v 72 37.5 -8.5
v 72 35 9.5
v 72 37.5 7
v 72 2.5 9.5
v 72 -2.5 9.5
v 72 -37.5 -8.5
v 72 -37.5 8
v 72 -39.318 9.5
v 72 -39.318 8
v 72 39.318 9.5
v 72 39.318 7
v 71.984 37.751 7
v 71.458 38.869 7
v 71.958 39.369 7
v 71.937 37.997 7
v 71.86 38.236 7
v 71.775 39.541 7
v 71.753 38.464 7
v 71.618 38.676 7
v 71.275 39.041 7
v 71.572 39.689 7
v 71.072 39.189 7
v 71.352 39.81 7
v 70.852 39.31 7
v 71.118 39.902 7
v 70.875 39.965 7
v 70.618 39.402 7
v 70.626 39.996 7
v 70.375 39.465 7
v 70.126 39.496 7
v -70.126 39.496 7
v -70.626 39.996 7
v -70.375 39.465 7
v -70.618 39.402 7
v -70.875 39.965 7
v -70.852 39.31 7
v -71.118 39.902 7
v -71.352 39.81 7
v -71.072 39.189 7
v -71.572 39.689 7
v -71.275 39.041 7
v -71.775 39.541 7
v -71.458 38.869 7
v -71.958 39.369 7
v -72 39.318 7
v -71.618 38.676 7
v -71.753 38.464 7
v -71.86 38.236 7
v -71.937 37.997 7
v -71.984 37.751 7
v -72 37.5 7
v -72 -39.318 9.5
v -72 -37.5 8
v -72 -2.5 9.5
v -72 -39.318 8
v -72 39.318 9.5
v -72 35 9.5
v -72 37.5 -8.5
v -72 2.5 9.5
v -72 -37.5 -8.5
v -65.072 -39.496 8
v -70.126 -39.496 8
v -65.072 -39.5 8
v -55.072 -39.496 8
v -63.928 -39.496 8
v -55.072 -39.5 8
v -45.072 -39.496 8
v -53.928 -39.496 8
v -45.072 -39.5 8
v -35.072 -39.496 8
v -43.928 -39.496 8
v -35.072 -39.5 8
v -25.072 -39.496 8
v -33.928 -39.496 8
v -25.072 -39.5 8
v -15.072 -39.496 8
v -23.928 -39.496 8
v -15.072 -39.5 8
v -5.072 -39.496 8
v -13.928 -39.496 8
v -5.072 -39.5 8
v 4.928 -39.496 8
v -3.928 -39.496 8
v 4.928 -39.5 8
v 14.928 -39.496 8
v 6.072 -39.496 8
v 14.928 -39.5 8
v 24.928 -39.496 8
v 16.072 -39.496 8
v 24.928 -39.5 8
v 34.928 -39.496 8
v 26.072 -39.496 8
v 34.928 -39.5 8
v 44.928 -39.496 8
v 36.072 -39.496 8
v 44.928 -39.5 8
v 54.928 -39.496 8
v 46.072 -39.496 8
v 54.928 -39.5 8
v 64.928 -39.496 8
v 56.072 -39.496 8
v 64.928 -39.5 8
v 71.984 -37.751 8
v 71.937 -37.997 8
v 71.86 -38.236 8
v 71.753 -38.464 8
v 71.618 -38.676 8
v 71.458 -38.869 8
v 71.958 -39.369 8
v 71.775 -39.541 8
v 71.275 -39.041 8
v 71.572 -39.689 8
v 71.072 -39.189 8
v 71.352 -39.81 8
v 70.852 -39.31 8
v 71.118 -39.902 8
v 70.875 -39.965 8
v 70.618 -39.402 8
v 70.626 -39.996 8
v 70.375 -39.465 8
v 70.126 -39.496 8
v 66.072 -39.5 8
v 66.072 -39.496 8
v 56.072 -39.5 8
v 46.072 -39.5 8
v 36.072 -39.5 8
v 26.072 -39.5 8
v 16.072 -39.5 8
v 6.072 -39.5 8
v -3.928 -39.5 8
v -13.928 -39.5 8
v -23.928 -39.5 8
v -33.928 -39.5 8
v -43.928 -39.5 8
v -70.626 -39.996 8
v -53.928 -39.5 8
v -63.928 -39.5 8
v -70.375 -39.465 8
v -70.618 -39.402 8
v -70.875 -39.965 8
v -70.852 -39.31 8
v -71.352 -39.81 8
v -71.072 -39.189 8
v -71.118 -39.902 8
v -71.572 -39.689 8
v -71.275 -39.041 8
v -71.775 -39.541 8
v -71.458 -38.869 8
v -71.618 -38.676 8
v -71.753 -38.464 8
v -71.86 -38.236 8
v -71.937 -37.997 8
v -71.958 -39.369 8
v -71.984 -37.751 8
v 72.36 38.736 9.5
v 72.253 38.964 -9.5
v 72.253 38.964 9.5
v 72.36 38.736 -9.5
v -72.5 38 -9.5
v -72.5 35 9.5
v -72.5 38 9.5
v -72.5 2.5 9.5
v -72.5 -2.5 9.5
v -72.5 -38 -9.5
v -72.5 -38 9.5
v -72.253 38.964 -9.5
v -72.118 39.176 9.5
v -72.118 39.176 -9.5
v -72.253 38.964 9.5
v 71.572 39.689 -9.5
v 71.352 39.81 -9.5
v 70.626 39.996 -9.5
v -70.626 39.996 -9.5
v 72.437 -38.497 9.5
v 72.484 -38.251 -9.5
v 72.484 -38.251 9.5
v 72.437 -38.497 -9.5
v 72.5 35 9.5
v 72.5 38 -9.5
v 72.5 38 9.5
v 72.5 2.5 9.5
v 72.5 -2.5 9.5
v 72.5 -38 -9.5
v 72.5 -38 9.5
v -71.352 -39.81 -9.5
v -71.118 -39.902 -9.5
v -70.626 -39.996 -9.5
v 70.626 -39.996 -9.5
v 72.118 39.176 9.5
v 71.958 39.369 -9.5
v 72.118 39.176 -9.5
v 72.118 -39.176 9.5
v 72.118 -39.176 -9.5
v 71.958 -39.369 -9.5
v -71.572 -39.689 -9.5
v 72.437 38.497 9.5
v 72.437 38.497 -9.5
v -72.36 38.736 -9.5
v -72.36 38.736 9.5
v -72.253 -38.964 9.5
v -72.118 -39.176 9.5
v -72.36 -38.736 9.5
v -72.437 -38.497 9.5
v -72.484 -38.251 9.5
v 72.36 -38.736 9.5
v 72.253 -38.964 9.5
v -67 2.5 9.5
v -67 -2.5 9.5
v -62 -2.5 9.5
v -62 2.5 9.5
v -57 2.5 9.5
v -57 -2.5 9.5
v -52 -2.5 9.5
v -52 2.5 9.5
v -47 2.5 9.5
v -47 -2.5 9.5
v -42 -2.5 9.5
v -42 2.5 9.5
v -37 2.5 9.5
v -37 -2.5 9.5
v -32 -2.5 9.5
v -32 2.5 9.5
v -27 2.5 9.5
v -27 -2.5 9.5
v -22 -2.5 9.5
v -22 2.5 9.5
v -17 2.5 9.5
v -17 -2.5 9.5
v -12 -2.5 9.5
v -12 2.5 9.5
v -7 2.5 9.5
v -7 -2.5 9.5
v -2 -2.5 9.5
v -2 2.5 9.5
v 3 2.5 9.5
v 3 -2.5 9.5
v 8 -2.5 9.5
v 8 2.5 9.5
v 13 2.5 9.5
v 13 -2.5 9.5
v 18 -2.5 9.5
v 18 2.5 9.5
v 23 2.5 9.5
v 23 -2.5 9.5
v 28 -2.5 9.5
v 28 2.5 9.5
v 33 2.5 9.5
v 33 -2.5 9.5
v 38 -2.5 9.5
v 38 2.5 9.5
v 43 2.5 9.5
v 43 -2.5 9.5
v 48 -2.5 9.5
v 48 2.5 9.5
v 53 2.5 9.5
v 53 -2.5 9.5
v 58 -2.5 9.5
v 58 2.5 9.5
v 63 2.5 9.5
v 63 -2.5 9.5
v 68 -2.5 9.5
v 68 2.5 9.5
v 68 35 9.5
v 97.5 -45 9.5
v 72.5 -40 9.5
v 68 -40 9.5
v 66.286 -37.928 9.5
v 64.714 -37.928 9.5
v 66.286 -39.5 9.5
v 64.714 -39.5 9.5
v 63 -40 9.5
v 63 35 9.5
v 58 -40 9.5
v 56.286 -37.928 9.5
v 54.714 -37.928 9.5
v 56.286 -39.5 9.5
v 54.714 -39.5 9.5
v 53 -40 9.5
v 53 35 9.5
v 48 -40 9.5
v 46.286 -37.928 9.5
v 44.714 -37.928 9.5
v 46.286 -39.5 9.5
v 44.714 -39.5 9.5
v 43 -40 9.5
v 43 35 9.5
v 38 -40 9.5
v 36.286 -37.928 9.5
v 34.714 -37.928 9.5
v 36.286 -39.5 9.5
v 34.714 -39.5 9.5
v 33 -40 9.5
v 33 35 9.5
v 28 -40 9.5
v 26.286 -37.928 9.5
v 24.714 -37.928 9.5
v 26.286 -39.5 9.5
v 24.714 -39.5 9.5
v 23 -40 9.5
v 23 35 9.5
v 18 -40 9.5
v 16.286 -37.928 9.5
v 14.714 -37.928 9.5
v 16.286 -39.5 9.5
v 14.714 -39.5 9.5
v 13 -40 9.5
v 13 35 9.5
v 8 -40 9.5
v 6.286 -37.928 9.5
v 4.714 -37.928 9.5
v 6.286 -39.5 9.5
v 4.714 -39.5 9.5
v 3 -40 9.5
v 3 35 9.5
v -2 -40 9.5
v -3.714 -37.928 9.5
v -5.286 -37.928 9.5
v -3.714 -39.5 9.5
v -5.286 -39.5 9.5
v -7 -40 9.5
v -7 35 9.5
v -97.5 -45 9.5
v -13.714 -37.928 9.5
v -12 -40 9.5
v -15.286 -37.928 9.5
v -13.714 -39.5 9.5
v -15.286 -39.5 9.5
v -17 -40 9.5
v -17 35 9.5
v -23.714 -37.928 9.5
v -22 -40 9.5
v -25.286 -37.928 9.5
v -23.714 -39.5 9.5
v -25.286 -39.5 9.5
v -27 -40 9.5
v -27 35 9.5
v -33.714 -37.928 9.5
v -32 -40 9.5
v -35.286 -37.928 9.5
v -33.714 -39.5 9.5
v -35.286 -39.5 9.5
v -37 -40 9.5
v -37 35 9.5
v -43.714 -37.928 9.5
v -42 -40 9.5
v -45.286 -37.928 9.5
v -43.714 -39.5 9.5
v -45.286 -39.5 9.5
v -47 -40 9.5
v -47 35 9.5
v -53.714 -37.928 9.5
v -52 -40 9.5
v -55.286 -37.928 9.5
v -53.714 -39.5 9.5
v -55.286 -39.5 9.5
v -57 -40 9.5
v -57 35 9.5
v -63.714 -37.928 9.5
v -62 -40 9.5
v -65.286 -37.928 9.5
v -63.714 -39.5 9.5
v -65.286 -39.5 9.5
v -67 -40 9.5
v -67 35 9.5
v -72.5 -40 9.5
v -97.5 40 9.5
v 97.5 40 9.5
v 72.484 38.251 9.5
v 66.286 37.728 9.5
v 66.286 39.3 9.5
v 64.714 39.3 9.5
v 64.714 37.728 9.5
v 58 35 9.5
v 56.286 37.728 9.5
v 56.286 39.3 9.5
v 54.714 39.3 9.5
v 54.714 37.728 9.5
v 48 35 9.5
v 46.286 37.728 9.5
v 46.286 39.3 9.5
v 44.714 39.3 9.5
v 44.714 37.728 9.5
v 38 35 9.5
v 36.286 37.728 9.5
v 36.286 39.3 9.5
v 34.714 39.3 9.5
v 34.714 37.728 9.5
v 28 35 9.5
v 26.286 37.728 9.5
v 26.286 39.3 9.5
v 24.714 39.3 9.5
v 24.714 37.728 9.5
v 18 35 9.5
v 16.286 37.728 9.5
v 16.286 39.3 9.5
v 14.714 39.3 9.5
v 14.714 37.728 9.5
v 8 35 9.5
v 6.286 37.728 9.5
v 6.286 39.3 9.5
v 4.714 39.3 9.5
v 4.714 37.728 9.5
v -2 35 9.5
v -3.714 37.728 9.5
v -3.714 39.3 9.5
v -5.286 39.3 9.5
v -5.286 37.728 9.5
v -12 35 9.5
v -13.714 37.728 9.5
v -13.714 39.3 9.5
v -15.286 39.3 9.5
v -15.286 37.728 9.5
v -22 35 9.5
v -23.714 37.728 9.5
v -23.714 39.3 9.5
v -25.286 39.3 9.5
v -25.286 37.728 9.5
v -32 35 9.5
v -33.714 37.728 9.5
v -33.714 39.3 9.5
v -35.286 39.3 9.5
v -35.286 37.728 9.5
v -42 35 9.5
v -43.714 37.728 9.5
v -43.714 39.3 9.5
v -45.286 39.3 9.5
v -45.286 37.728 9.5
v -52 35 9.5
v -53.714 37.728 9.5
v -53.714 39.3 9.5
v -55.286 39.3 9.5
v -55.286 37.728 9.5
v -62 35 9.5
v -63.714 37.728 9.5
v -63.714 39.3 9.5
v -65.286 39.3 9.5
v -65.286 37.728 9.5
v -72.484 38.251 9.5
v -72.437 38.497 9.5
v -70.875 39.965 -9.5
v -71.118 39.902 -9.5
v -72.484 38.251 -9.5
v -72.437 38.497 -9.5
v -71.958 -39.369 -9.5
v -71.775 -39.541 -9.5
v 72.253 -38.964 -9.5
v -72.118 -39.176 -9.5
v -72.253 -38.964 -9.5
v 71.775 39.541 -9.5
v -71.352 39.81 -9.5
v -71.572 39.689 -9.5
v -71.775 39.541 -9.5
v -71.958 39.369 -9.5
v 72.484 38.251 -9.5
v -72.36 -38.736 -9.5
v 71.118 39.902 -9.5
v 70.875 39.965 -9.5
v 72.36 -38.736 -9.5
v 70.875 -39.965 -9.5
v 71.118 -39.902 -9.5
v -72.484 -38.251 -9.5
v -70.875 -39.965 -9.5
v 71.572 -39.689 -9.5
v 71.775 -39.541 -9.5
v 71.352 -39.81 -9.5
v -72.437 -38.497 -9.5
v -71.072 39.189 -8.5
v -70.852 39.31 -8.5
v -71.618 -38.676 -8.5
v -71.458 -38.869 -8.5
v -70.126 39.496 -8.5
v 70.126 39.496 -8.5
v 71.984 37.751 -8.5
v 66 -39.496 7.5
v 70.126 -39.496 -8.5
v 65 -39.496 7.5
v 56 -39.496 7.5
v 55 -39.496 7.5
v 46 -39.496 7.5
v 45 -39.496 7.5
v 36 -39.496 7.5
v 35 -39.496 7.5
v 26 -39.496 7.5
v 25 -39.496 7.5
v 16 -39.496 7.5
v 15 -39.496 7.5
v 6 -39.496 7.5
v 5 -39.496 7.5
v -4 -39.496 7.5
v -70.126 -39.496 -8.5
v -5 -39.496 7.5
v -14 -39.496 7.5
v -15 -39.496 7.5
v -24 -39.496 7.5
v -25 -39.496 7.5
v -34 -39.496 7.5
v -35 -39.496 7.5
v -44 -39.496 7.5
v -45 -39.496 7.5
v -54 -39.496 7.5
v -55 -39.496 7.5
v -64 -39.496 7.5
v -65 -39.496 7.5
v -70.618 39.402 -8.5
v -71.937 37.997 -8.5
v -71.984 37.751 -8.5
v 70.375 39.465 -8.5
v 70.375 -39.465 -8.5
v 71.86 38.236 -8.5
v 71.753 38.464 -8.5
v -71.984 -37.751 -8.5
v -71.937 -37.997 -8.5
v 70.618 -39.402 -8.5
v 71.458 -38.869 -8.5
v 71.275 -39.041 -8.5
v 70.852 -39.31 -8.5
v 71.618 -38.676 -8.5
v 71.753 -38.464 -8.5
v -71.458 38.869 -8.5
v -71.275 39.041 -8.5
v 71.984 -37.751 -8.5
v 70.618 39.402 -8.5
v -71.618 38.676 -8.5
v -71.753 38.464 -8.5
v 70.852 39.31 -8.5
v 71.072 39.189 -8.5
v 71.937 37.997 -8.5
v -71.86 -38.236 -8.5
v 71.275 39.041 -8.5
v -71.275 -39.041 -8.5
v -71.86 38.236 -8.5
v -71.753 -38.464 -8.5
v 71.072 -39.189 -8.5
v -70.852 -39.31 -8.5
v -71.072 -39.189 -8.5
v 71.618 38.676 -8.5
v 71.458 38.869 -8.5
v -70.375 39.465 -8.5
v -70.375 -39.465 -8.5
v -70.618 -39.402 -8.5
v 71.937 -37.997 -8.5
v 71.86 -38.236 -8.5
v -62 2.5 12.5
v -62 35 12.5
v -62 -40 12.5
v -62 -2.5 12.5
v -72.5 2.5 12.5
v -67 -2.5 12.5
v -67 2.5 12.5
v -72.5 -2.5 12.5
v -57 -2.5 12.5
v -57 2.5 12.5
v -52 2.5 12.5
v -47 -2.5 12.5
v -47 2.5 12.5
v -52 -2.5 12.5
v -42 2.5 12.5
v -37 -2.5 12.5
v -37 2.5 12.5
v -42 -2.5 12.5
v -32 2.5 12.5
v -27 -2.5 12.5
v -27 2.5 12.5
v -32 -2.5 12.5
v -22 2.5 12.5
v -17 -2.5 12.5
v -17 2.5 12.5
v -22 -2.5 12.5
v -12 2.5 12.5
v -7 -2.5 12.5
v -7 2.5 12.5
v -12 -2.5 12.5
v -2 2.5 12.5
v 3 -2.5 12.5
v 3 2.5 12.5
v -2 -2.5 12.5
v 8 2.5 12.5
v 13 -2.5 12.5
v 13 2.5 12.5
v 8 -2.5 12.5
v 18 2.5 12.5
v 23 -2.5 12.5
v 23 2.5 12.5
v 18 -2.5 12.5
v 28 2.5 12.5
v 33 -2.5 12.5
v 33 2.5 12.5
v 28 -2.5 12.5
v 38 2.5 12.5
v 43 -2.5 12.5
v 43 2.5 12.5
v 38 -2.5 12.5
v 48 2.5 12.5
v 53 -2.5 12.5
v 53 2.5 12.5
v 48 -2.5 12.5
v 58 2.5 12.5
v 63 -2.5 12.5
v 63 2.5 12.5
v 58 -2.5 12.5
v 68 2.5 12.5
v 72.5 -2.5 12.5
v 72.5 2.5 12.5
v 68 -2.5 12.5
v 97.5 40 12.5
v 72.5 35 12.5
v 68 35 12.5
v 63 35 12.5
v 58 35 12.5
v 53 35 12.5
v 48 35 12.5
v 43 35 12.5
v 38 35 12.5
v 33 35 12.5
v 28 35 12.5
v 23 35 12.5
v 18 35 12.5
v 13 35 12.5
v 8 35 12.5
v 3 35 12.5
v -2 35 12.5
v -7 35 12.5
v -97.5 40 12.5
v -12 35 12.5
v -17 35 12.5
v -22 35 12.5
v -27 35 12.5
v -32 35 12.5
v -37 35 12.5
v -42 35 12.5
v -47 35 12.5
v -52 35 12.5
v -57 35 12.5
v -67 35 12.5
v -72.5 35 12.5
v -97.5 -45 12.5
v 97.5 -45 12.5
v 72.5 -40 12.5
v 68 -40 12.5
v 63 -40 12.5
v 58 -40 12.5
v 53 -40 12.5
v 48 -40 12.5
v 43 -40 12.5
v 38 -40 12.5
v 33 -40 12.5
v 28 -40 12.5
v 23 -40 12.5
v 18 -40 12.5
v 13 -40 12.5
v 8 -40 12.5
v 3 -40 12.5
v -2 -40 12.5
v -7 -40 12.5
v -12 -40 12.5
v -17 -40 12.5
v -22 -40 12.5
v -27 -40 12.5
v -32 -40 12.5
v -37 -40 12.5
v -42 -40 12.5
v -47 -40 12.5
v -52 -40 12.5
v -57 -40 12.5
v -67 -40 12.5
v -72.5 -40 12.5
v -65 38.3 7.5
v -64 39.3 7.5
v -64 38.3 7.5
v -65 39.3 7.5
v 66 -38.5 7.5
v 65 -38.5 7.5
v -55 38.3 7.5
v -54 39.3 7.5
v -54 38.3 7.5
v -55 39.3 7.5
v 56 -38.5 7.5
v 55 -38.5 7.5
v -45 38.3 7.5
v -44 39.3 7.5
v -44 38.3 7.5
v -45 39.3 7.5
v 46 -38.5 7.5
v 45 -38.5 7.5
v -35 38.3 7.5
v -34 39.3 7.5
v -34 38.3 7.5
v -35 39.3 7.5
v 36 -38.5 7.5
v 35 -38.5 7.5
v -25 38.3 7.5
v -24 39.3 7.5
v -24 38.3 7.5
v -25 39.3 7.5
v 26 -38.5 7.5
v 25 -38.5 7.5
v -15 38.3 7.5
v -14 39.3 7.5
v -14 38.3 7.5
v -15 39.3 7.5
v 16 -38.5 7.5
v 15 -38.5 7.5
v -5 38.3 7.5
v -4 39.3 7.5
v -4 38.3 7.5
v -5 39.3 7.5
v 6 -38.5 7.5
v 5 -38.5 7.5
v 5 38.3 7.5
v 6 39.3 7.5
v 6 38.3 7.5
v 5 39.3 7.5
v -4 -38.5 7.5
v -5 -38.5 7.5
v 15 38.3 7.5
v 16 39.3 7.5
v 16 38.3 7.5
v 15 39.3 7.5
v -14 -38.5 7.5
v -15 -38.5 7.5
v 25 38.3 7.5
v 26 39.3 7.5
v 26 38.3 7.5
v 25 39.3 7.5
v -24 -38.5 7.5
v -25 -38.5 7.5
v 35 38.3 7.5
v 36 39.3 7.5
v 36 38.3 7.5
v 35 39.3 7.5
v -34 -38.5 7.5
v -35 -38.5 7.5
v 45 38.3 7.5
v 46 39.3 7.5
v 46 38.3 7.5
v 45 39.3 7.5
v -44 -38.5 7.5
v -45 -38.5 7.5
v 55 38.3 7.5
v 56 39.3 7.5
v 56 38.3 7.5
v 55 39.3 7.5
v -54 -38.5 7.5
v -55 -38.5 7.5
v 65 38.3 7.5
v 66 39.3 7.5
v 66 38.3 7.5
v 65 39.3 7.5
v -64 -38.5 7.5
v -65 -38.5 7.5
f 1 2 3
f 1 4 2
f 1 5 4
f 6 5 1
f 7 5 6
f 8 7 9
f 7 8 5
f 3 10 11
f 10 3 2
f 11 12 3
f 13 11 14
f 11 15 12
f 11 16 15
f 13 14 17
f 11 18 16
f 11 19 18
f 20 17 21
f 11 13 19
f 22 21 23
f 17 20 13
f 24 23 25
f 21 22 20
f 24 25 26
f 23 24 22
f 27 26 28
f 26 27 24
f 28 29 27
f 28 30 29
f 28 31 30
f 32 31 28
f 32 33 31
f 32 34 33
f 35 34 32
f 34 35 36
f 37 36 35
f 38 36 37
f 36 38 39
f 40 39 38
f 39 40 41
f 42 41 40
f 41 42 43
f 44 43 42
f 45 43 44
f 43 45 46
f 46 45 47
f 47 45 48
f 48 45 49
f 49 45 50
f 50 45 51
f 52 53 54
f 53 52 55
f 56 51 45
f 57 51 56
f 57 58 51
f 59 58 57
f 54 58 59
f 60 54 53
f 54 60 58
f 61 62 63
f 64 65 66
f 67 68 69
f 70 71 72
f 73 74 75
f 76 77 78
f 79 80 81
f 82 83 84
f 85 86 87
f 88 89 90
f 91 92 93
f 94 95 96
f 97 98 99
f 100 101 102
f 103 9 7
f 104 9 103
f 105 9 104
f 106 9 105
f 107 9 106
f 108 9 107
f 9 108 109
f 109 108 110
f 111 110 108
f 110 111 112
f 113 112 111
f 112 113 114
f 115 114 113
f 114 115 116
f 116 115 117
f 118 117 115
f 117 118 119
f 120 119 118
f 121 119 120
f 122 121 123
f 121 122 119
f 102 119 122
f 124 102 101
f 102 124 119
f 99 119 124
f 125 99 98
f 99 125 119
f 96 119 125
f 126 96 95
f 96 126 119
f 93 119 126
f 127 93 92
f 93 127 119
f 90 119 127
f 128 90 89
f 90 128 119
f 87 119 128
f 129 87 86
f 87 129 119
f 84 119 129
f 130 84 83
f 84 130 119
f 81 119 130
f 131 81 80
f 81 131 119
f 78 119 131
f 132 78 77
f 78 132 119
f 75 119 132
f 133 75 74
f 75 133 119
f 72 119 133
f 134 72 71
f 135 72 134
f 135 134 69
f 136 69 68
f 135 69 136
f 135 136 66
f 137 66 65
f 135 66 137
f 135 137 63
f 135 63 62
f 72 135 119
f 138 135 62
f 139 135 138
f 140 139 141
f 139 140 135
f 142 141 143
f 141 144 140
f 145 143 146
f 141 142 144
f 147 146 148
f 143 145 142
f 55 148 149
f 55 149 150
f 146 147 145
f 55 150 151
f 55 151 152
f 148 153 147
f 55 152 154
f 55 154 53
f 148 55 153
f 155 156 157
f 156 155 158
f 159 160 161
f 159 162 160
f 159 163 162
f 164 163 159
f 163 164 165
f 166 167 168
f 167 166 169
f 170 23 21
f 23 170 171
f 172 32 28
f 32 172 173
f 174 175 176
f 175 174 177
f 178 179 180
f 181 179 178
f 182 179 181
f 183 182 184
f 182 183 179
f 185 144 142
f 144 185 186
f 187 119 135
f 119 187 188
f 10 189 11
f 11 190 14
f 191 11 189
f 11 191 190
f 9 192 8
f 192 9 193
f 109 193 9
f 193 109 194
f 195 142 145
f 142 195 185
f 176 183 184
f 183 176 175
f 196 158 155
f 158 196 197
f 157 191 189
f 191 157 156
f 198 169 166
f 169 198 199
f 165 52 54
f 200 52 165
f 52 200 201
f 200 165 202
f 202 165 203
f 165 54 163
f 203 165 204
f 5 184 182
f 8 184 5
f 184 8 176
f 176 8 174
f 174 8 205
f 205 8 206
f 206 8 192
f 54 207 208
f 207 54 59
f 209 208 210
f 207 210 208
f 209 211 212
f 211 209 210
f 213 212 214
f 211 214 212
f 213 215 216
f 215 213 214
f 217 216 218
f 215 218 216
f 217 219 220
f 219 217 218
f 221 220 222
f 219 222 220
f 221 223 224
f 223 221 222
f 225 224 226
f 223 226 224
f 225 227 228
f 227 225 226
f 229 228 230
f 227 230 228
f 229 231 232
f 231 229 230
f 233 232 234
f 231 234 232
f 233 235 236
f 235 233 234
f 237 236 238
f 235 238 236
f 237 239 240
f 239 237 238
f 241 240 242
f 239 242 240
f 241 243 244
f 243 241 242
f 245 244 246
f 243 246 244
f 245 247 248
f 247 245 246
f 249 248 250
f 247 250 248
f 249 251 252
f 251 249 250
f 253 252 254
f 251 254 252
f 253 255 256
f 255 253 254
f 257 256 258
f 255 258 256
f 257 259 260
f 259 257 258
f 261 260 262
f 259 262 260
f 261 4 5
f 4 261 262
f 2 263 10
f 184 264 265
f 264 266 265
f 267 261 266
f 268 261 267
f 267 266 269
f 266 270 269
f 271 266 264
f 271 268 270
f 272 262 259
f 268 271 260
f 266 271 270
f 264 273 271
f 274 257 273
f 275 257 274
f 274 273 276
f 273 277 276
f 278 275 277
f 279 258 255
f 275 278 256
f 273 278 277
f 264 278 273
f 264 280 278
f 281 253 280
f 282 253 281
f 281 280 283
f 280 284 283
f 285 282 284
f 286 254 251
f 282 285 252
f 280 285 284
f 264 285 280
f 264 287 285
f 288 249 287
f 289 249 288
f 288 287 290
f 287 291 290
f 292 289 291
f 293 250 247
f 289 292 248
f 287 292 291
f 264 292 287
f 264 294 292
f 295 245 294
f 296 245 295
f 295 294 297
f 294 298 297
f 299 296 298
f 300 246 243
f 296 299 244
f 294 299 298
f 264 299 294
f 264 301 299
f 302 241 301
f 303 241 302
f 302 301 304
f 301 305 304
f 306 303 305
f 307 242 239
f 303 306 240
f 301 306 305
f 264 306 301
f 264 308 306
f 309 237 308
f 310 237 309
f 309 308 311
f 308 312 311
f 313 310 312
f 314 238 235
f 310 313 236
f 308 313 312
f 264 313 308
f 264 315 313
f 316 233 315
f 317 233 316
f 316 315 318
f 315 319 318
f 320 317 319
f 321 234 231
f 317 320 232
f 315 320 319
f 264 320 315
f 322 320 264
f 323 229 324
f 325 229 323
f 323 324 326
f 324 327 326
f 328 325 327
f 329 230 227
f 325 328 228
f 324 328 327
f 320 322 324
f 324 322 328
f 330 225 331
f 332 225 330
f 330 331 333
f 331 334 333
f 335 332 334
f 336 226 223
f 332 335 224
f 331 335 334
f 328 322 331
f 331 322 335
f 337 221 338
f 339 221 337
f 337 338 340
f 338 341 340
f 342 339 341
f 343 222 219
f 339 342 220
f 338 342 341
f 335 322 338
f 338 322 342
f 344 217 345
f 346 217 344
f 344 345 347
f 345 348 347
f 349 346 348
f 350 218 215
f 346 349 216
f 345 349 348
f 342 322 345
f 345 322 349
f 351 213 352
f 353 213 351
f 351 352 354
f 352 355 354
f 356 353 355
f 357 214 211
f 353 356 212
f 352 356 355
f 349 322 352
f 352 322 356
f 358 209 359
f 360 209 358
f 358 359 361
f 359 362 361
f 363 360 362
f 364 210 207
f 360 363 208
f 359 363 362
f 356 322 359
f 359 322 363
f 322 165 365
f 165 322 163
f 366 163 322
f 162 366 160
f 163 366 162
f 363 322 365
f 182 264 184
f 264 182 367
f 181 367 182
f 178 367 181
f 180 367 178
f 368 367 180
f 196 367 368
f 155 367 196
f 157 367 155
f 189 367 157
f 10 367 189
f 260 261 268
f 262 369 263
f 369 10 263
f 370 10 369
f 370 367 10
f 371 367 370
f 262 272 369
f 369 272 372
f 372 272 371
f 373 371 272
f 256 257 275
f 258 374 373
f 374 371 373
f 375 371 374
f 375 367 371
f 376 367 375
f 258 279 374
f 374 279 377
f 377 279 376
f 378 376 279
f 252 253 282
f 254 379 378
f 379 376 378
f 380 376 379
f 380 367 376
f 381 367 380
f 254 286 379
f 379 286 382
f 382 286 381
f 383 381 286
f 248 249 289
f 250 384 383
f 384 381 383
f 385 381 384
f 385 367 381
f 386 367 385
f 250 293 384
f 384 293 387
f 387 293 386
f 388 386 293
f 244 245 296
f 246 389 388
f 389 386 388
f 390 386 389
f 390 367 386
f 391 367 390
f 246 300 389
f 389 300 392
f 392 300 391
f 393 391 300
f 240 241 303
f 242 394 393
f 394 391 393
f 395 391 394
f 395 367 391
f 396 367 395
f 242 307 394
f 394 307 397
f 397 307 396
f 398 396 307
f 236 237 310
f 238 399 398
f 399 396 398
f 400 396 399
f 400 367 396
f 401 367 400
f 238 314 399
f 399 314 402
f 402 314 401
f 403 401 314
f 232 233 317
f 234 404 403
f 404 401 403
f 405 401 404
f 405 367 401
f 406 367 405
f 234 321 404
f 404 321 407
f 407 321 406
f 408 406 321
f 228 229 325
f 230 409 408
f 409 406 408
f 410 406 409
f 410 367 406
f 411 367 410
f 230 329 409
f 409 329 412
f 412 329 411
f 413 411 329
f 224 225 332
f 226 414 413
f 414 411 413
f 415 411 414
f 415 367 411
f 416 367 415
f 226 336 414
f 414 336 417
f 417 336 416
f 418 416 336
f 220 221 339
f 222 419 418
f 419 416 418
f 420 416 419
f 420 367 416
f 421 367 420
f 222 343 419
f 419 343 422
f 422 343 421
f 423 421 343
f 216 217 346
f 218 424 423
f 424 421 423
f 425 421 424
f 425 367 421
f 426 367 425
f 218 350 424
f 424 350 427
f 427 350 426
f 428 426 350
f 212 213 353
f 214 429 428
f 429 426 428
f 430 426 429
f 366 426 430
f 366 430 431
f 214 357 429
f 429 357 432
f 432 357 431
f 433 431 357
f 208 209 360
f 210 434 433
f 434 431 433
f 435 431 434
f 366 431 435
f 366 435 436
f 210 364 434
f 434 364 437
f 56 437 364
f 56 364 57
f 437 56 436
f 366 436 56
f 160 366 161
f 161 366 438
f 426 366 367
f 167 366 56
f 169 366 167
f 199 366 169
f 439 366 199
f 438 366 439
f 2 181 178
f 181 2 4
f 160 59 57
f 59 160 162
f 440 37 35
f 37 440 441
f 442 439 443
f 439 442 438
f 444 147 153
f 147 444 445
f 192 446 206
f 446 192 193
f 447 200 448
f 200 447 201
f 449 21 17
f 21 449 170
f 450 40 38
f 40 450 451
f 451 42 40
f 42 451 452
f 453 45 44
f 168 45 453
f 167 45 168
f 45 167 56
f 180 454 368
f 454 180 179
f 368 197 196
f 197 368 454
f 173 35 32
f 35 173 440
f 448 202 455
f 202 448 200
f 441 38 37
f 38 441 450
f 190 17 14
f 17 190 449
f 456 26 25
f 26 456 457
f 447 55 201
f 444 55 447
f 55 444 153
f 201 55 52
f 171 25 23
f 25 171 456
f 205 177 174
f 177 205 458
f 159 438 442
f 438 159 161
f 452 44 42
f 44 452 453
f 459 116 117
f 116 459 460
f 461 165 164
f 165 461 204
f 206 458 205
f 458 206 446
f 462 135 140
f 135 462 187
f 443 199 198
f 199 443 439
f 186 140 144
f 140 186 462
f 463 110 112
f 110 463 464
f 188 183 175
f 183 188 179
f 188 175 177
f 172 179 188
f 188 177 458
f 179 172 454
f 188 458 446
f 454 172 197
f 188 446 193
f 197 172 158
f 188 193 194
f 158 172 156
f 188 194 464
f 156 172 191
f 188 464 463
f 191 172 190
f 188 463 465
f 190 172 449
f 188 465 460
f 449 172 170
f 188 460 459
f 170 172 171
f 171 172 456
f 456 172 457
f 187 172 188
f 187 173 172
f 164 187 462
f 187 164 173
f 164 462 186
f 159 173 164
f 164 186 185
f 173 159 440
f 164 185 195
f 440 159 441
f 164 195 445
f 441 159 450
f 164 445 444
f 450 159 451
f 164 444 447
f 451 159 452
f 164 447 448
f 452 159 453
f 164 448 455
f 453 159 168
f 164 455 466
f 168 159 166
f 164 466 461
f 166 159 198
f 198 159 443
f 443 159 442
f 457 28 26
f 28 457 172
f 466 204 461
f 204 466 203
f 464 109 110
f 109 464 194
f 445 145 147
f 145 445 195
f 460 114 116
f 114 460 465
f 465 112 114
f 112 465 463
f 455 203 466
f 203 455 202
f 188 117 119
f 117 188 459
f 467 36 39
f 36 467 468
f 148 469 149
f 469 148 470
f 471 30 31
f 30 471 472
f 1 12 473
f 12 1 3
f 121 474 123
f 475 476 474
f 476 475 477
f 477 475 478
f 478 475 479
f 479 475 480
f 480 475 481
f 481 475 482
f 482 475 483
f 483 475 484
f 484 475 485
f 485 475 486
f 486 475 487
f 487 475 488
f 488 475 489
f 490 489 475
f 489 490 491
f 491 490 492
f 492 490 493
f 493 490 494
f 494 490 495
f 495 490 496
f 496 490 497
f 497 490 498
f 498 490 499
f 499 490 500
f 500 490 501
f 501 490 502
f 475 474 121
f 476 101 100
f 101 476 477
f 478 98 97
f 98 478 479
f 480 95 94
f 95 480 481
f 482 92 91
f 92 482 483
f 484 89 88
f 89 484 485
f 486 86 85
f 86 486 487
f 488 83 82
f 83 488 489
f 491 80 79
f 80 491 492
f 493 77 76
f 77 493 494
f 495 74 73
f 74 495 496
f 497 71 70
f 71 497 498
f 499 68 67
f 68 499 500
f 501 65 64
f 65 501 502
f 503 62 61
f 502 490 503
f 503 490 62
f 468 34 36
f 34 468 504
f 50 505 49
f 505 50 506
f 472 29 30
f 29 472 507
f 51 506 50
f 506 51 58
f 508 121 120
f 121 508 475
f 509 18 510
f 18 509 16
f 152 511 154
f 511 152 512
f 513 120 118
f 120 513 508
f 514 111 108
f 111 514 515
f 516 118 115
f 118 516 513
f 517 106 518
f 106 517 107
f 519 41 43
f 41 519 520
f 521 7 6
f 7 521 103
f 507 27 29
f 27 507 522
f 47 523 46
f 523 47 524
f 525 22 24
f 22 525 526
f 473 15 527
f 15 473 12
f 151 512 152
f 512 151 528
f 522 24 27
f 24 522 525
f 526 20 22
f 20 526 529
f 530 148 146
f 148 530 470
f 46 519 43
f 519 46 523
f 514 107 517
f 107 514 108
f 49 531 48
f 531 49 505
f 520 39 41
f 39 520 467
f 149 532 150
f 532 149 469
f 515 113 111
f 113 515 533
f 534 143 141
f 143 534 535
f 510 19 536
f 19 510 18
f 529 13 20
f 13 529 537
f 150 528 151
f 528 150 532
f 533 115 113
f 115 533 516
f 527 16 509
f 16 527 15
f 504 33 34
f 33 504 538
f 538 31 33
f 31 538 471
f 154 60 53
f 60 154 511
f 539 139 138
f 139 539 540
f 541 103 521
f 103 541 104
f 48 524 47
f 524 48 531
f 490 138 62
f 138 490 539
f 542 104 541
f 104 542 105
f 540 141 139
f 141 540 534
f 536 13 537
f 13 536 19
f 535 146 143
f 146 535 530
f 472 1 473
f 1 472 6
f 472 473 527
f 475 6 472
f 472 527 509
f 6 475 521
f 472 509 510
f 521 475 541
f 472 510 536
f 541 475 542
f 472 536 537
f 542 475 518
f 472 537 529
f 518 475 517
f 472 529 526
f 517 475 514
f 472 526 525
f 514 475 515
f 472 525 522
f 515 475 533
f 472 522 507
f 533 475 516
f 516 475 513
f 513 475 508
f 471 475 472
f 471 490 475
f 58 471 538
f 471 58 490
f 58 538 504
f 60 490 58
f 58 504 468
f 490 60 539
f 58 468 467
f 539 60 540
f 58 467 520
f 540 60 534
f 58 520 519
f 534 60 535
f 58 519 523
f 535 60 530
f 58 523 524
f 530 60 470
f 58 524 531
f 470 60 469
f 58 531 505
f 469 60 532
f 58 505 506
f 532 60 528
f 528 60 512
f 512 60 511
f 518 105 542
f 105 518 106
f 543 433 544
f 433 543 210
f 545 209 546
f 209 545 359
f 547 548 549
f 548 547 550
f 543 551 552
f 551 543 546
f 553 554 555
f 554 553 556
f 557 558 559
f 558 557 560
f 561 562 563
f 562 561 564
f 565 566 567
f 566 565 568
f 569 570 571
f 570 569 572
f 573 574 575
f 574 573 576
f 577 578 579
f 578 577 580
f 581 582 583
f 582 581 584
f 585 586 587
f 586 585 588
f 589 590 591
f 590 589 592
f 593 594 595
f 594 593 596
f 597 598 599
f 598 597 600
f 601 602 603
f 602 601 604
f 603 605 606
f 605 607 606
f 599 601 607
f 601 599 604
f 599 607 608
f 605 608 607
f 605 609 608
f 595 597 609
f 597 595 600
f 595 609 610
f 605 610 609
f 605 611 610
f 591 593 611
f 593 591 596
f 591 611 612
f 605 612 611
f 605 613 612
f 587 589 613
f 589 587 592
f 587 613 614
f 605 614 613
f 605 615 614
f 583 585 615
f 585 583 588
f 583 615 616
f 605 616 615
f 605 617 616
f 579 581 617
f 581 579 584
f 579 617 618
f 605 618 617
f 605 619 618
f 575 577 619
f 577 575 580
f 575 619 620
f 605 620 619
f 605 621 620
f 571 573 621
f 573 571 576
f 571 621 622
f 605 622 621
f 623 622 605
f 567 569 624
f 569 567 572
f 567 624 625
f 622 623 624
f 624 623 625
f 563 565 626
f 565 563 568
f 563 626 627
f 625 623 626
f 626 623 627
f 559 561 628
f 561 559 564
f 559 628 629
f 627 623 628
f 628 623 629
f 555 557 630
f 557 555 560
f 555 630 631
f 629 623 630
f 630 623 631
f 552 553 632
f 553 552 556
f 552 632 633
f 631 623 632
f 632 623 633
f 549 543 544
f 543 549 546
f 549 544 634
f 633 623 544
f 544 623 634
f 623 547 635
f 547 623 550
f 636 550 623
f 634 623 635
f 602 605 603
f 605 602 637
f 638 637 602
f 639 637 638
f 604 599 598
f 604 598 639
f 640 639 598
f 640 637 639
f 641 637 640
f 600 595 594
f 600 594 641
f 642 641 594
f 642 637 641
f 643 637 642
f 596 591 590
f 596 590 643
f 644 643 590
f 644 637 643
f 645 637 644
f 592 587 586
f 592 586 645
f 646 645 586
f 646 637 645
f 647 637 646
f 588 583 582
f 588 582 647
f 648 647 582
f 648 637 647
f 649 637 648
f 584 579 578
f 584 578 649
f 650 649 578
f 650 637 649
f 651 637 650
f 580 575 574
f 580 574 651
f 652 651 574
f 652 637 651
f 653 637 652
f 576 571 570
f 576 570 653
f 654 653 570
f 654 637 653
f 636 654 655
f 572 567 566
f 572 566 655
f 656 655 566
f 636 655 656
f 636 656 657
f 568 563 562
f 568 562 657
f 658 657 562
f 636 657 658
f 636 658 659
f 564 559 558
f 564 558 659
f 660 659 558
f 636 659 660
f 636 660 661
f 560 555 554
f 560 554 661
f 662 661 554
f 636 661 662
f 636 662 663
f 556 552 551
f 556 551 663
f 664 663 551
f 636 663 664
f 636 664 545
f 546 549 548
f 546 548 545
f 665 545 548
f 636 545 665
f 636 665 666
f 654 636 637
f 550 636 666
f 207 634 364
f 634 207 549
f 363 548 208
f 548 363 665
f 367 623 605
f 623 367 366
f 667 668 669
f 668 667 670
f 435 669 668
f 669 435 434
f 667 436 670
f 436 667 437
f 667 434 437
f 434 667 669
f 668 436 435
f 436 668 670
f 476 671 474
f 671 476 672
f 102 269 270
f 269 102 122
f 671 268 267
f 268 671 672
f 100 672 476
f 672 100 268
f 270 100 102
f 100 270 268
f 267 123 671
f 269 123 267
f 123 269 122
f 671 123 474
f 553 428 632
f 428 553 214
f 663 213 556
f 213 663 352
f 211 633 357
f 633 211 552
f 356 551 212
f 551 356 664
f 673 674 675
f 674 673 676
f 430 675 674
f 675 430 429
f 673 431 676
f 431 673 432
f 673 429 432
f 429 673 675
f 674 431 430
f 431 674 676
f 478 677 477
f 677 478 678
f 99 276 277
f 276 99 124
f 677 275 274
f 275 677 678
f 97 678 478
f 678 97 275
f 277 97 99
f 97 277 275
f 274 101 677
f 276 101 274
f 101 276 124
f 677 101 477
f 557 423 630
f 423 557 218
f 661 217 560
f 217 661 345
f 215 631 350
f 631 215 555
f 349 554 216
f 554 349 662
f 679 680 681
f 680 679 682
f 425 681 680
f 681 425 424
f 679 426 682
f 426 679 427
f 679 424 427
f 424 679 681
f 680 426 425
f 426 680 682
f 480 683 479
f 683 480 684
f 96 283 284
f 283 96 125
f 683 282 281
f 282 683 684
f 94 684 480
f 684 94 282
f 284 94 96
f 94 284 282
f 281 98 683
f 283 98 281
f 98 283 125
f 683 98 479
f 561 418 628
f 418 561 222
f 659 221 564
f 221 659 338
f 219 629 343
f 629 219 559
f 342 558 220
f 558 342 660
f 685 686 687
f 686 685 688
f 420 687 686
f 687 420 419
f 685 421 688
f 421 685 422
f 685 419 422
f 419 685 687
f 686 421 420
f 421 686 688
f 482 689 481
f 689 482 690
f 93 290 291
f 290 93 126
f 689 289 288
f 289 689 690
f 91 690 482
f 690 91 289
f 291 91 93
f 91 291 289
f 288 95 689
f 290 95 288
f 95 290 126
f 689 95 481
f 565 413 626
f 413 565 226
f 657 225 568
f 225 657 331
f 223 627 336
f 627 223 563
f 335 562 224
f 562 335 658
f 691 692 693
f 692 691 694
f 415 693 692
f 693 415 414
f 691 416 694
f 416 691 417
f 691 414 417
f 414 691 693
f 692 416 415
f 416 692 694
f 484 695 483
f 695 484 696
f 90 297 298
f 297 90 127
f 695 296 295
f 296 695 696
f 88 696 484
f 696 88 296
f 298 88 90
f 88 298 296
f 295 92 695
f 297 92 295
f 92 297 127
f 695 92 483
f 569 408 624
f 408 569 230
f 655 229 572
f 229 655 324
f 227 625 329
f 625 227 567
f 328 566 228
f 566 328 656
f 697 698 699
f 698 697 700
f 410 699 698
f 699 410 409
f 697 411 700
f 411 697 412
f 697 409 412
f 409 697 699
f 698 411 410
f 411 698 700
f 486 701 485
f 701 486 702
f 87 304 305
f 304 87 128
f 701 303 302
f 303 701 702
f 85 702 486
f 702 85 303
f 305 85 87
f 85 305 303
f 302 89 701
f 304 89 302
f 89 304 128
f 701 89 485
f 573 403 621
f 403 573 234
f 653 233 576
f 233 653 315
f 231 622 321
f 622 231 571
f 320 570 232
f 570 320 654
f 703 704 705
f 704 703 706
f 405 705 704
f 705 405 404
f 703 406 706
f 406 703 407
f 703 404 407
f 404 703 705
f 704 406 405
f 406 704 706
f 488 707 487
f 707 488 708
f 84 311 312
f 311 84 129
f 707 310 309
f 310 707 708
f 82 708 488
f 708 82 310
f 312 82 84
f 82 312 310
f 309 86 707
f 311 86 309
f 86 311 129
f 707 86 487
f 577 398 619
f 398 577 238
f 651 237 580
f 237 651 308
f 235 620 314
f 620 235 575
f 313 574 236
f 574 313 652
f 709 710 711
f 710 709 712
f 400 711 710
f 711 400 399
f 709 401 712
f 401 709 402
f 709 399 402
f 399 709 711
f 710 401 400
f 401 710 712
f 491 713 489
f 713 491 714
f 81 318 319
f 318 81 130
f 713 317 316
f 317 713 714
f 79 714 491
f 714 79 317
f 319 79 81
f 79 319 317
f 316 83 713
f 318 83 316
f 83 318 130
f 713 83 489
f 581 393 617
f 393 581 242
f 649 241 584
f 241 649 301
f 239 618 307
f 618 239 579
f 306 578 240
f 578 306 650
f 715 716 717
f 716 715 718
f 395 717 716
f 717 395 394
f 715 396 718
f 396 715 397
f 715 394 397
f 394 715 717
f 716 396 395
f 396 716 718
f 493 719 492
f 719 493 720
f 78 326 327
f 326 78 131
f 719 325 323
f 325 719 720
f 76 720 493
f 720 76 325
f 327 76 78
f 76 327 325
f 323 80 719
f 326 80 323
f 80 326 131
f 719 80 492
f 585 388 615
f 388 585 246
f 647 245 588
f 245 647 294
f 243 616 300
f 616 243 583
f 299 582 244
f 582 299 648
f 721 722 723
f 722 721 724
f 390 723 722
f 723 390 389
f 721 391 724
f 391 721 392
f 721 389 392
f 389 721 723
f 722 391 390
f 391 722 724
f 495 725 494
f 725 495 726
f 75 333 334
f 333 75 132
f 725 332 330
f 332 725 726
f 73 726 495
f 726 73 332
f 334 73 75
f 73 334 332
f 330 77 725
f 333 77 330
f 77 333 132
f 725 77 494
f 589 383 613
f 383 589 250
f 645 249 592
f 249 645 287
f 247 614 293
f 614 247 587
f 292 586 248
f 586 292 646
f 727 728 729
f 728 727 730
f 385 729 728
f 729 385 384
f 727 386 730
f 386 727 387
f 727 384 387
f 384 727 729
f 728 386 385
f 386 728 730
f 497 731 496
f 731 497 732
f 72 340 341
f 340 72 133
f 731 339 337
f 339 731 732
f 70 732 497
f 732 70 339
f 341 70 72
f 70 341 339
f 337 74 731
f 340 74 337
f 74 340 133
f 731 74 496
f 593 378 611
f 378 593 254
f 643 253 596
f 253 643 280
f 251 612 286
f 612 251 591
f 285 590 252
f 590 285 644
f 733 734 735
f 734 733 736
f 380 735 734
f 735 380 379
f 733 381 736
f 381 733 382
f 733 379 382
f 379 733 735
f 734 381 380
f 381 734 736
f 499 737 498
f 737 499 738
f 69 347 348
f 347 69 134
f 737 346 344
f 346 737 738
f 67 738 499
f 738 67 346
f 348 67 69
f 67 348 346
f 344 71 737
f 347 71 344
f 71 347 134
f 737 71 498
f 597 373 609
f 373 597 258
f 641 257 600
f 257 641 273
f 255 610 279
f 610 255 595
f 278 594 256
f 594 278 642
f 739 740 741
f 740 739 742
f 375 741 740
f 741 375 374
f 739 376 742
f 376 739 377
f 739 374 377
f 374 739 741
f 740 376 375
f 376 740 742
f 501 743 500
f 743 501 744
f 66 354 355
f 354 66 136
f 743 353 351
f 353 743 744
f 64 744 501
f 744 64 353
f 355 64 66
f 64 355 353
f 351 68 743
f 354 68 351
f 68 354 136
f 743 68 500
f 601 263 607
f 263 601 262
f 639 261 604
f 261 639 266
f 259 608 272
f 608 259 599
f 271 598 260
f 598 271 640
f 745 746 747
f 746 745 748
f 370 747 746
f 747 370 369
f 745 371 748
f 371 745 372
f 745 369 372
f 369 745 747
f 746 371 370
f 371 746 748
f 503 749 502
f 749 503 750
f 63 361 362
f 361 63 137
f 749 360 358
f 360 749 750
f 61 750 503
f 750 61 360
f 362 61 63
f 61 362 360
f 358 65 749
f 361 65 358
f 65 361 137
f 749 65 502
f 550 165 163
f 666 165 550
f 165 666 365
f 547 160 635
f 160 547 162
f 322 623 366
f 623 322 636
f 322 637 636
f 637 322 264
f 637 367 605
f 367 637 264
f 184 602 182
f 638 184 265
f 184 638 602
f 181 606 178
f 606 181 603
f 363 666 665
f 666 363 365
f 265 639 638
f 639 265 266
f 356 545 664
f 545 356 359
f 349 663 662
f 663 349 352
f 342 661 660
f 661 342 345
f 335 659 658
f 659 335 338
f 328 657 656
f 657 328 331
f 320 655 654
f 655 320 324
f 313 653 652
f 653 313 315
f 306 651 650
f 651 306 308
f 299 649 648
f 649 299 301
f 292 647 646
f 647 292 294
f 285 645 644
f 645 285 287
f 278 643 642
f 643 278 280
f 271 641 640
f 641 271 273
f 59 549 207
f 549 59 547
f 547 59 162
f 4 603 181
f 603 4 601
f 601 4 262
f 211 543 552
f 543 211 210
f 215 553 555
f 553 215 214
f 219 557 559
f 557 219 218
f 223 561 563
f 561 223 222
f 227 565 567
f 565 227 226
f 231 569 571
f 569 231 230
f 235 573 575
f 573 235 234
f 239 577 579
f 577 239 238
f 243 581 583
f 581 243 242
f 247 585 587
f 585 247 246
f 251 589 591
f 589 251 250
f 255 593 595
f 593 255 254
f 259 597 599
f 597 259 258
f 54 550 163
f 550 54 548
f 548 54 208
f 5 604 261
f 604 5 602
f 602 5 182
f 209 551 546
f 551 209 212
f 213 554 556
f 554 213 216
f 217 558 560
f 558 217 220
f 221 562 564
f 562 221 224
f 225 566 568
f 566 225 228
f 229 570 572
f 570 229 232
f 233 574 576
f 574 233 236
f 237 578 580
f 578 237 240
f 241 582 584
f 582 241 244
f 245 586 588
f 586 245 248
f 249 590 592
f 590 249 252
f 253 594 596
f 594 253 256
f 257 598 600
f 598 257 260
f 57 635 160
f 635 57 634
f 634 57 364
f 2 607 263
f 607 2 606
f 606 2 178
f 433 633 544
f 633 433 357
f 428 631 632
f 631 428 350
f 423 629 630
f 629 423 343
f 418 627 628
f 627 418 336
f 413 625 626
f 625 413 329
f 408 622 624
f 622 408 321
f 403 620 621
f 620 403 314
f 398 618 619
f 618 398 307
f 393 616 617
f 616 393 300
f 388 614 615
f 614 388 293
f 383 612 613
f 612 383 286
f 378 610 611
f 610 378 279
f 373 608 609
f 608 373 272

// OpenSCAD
////////////////////////////////////////////
// Parameter
////////////////////////////////////////////

Gesamtlaenge      = 195;
Gesamtbreite      = 85;
Gesamthoehe       = 22;

Fuehrungbreite    = 5;

Klotz             = 25;
Lippebreite       = 5;
Gitterhoehe        = 3;

////////////////////////////////////////////
// Items
////////////////////////////////////////////

Schale = true;
Gitter = true;
Fuehrung = false;
Gittereinschub = true;
tropfschale = false;

if (Schale) Schale();
if (Gitter) Gitter();
if (Fuehrung) Fuehrung();
if (tropfschale) tropfschale();


////////////////////////////////////////////
// Modul Schale
////////////////////////////////////////////
module Schale(){
    difference () {
        Wandstaerke = 1;
        MinkRadius = 2;
        MinkHoehe = 2;
        zentriert = true;
        
        Lx = Gesamtlaenge-2*MinkRadius-2*Klotz;
        Bx = Gesamtbreite-2*MinkRadius-Lippebreite; 
        Hx = Gesamthoehe-MinkHoehe-Gitterhoehe;
        
        $fn=50;
        minkowski() {
            cube([Lx,Bx,Hx], center=zentriert);
            cylinder(r=MinkRadius,h=MinkHoehe,center=zentriert);
         }
         
         //aushöhlen
         translate([0,0,Wandstaerke])
         minkowski(){
            cube([Lx-Wandstaerke,Bx-Wandstaerke,Hx],center=zentriert);
            cylinder(r=MinkRadius,h=MinkHoehe,center=zentriert);
        }
        if (Gittereinschub) GitterEinschub();
    }

    // Führung
    if (Fuehrung) Fuehrung();
}
////////////////////////////////////////////
// Modul Gitter
////////////////////////////////////////////
module Gitter() {

    zentriert = true;

    difference() {
        union() {
            
            // links + rechts
            translate([-Gesamtlaenge/2+Klotz/2,-Lippebreite/2,Gesamthoehe/2])
            cube([Klotz,Gesamtbreite,Gitterhoehe],center=zentriert);
            translate([Gesamtlaenge/2-Klotz/2,-Lippebreite/2,Gesamthoehe/2])
            cube([Klotz,Gesamtbreite,Gitterhoehe],center=zentriert);

            // vorne + mitte + hinten
            translate([0,-Gesamtbreite/2,Gesamthoehe/2])
            cube([Gesamtlaenge-2*Klotz,Lippebreite,Gitterhoehe],center=zentriert);
            translate([0,0,Gesamthoehe/2])
            cube([Gesamtlaenge-2*Klotz,Lippebreite,Gitterhoehe],center=zentriert);
            translate([0,-Lippebreite+Gesamtbreite/2,Gesamthoehe/2])
            cube([Gesamtlaenge-2*Klotz,Lippebreite,Gitterhoehe],center=zentriert);
            
            // Stäbe
            for(i = [-Gesamtlaenge/2+Klotz+8 : 10 : Gesamtlaenge/2-Klotz]) {
                translate([i,-2,Gesamthoehe/2])
                cube([5,Gesamtbreite-1,Gitterhoehe],center=zentriert);
                
                // Nippel hinten
                translate([i,Gesamtbreite/2-4.2,Gesamthoehe/2])
                RastNippel();
                
                // Nippel vorn
                rotate([0,0,180])
                translate([i-1,Gesamtbreite/2-4,Gesamthoehe/2])
                RastNippel();
            }
        }

        if (Fuehrung) Fuehrung();
    }
}
////////////////////////////////////////////
// Modul Führung
////////////////////////////////////////////
module Fuehrung() {
    Wandstaerke = 1;
    zentriert = true;
    
    Lx = Gesamtlaenge/2+Fuehrungbreite/2;
    Bx = Gesamtbreite/2;
    
    // links
    translate([-Lx+Klotz,0,Gesamthoehe/2-Wandstaerke/2])
    cube([Fuehrungbreite,Gesamtbreite-Lippebreite,Wandstaerke],center=zentriert);
    translate([-Lx+Klotz,0,Gesamthoehe/2-Gitterhoehe-Wandstaerke])
    cube([Fuehrungbreite,Gesamtbreite-Lippebreite,Wandstaerke],center=zentriert);
    
    // rechts
    translate([Lx-Klotz,0,Gesamthoehe/2-Wandstaerke/2])
    cube([Fuehrungbreite,Gesamtbreite-Lippebreite,Wandstaerke],center=zentriert);
    translate([Lx-Klotz,0,Gesamthoehe/2-Gitterhoehe-Wandstaerke])
    cube([Fuehrungbreite,Gesamtbreite-Lippebreite,Wandstaerke],center=zentriert);

    // hinten
    translate([0,Bx-Fuehrungbreite,Gesamthoehe/2-Gitterhoehe-Wandstaerke])
    cube([Gesamtlaenge-2*Klotz,Fuehrungbreite,Wandstaerke],center=zentriert);
    
}
////////////////////////////////////////////
// Modul GitterEinschub
////////////////////////////////////////////
module GitterEinschub() {
    zentriert = true;
    Wandstaerke = 1;

    translate([0,Gesamtbreite/2,Gesamthoehe/2-Gitterhoehe/2])
    cube([Gesamtlaenge-2*Klotz-1,10,Gitterhoehe+2],center=zentriert);
    translate([0,-Gesamtbreite/2,Gesamthoehe/2-Gitterhoehe/2])
    cube([Gesamtlaenge-2*Klotz-1,10,Gitterhoehe],center=zentriert);

}

////////////////////////////////////////////
// Modul RastNippel
////////////////////////////////////////////
module RastNippel() {

    Nippelsize = 2;

    hull() {
        cube([Nippelsize,Nippelsize,0.01], center=true);
        translate([0,0.5,-3]) cube([1,1,1], center=true);
    }    
}


module tropfschale() {
    Schale();
    Gitter();
}
